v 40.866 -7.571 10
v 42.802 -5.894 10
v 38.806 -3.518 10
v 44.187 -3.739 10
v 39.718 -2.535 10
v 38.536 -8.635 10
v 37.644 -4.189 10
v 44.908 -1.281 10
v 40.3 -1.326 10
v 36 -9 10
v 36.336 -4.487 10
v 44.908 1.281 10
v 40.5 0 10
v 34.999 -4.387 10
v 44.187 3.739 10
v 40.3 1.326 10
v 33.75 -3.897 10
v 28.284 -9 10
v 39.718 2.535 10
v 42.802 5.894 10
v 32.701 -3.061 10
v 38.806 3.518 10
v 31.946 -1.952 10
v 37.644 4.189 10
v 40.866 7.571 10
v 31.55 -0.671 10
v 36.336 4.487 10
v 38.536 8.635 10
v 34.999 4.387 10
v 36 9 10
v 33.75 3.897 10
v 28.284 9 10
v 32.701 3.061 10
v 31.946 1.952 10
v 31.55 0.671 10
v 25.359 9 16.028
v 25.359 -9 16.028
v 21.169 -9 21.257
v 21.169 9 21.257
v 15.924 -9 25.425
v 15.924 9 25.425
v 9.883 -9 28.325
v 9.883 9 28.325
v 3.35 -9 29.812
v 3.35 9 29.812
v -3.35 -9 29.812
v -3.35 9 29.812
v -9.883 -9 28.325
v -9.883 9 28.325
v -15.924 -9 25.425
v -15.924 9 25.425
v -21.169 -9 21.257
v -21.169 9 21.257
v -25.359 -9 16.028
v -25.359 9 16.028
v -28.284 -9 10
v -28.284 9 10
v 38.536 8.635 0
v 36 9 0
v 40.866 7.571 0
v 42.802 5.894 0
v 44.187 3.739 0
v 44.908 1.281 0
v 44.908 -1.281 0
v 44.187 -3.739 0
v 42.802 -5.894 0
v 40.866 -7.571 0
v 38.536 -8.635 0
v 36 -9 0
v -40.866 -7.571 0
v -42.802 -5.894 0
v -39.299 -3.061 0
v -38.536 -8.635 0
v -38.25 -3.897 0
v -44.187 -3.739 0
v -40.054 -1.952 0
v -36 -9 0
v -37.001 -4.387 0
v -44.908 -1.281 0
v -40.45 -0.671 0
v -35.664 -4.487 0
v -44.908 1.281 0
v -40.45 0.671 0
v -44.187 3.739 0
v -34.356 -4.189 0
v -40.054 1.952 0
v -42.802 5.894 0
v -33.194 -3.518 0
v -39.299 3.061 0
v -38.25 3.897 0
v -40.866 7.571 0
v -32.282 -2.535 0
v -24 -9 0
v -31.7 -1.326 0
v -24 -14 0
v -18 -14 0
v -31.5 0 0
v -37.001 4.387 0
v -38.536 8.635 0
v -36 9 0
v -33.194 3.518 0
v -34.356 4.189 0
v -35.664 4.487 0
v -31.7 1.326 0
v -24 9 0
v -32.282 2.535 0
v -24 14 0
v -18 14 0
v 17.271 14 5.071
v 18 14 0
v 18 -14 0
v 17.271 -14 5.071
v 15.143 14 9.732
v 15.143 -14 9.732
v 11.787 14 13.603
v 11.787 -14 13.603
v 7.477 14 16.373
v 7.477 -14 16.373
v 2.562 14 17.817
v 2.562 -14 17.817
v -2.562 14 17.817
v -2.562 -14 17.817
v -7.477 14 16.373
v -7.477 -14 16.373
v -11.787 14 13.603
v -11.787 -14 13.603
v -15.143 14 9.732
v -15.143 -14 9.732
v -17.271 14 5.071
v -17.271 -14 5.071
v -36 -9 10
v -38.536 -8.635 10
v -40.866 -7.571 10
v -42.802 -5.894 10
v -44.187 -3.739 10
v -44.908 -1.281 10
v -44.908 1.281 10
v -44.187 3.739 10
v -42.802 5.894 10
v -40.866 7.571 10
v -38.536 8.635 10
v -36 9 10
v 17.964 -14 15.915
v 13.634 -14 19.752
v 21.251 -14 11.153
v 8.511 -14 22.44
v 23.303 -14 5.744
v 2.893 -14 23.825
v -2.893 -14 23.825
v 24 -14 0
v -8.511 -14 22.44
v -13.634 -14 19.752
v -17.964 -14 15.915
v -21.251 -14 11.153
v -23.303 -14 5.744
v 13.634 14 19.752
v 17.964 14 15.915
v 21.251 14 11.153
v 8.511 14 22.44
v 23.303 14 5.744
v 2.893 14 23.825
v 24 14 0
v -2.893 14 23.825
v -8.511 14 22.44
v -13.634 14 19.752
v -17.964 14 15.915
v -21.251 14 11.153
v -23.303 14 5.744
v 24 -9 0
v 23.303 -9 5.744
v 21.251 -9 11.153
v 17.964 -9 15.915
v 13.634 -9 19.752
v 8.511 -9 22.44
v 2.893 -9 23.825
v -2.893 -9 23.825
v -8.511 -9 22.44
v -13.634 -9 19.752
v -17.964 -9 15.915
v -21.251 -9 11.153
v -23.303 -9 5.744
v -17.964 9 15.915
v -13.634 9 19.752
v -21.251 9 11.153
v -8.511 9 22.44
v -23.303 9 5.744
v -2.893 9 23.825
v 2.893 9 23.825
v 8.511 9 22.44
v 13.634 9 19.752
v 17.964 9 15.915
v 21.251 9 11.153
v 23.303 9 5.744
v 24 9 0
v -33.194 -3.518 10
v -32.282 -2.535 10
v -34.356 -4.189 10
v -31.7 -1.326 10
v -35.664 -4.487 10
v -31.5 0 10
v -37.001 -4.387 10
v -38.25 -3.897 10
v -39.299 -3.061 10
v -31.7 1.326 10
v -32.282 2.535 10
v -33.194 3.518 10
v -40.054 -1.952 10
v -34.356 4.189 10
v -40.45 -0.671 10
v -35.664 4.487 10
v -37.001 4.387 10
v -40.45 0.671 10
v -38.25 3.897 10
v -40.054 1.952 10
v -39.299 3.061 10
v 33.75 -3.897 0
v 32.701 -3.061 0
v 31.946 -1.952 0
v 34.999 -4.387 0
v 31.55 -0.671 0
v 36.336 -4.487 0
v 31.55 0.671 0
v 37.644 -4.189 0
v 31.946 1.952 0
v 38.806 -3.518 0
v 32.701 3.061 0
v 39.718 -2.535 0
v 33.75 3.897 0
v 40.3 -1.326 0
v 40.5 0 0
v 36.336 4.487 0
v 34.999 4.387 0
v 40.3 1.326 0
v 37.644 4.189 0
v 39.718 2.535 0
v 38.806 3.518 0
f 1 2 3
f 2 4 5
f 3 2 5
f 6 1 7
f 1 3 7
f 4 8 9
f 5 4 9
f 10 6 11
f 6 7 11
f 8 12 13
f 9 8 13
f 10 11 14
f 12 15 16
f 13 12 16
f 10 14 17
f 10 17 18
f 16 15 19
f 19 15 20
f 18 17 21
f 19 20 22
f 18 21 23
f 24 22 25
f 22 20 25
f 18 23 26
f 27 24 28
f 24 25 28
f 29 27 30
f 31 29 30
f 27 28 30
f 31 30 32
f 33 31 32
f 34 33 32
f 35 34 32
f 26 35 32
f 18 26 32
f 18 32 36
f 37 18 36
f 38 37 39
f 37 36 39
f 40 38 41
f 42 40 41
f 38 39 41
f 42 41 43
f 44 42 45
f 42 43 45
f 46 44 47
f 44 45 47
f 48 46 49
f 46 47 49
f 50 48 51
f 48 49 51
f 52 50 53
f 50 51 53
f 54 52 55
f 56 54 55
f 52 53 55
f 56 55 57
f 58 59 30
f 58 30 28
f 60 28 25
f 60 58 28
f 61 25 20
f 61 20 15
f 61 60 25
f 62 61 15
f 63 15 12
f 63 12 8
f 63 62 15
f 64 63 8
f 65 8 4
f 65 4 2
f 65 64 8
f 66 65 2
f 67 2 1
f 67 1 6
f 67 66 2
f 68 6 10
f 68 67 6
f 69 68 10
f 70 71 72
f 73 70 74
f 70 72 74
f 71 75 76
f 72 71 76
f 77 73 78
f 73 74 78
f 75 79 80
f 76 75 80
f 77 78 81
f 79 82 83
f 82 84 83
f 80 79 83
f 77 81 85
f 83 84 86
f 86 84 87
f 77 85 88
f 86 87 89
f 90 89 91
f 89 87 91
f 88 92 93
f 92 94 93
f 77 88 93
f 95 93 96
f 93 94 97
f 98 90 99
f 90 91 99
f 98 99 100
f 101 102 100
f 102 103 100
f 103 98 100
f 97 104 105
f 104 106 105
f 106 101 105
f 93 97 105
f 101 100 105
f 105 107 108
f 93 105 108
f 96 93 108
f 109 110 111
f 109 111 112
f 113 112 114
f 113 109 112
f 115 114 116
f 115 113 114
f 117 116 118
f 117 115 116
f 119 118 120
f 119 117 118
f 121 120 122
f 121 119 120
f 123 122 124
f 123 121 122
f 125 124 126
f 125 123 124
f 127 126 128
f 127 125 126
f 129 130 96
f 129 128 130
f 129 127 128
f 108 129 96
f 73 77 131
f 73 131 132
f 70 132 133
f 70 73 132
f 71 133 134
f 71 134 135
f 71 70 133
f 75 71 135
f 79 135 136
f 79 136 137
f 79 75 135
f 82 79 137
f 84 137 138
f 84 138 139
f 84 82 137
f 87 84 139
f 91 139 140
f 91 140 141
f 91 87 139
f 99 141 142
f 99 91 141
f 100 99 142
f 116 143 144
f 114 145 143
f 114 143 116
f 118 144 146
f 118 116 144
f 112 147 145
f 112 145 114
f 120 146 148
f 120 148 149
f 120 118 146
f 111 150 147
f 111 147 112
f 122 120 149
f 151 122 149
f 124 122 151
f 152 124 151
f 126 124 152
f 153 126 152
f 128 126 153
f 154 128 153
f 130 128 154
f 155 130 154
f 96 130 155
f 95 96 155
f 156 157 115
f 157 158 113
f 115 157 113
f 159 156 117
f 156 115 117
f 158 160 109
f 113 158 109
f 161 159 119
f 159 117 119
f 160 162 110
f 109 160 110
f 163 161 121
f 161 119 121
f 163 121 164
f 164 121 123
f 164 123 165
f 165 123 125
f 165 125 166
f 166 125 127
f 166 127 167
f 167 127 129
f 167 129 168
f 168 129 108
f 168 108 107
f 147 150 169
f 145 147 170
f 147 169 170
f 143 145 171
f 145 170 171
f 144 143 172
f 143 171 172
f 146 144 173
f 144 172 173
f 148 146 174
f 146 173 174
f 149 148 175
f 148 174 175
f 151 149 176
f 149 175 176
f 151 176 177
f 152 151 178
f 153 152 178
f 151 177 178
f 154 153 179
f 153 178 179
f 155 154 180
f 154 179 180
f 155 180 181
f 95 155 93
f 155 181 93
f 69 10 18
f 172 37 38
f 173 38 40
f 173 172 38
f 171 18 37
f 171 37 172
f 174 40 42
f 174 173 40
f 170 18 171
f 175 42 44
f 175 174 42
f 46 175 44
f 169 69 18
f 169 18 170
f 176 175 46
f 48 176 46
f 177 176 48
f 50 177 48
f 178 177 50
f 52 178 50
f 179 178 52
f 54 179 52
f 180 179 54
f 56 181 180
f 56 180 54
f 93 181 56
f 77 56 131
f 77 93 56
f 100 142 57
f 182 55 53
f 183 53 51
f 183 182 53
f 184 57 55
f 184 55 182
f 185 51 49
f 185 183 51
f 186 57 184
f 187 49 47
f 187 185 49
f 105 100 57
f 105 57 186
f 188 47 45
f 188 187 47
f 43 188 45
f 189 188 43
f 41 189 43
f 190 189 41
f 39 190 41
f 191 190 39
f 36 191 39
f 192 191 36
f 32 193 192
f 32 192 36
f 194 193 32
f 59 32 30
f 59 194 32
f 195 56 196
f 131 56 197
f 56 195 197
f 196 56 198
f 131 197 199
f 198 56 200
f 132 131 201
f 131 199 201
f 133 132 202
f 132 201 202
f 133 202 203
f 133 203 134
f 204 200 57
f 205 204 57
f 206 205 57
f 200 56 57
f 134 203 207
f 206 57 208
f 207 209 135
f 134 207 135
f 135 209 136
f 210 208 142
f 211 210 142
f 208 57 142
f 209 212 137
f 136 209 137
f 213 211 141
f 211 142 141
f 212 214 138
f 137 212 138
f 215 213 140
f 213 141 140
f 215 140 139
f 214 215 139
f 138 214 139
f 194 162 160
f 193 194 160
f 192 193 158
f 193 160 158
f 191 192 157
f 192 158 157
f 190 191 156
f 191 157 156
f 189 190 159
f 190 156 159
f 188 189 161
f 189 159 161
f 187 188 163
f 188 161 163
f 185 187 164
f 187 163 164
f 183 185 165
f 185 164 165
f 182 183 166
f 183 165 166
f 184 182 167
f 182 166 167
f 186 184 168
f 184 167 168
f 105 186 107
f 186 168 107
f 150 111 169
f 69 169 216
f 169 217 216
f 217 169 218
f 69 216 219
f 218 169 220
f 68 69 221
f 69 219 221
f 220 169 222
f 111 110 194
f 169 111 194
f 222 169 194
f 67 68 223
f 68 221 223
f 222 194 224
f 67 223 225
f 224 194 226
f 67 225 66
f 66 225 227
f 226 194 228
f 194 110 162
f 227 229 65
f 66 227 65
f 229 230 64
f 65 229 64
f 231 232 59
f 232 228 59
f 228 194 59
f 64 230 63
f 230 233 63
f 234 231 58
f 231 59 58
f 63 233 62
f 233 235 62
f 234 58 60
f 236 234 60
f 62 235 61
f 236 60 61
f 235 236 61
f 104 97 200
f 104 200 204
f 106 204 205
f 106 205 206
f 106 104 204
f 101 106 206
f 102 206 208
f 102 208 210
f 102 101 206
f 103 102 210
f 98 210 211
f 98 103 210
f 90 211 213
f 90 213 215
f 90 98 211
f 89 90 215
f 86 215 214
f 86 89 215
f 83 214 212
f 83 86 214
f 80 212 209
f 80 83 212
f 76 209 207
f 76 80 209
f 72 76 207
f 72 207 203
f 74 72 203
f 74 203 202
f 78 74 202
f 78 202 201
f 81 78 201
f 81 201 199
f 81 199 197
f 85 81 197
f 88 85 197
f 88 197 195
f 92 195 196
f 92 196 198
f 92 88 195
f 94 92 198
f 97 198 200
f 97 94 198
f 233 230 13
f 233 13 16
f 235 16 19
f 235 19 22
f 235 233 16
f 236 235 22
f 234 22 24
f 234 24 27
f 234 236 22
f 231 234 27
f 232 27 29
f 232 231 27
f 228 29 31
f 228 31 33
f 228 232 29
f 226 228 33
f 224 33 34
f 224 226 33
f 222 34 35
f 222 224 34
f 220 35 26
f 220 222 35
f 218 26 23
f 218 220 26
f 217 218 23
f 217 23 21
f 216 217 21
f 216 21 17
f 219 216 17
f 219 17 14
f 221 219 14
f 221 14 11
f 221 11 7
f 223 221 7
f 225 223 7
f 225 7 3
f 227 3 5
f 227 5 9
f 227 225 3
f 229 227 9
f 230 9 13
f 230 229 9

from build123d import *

# Parameters (mm, degrees)
SKETCH_1_R          = 4.5
EXTRUDE_1_DEPTH     = 10
EXTRUDE_2_DEPTH     = 9
EXTRUDE_3_DEPTH     = 14
CUT_EXTRUDE_1_DEPTH = 29


with BuildPart() as part:
    # 草圖1 → 填料-伸長1 (new body)
    with BuildSketch(Plane.XY):
        with BuildLine():
            Line((-36, 9), (36, 9))
            ThreePointArc((36, 9), (45, 0), (36, -9))
            Line((36, -9), (-36, -9))
            ThreePointArc((-36, -9), (-45, 0), (-36, 9))
        make_face()
        with Locations((36, 0)):
            Circle(SKETCH_1_R, mode=Mode.SUBTRACT)
        with Locations((-36, 0)):
            Circle(SKETCH_1_R, mode=Mode.SUBTRACT)
    extrude(amount=EXTRUDE_1_DEPTH)

    # 草圖3 → 填料-伸長2 (add, symmetric)
    with BuildSketch(Plane(origin=(0, 0, 0), x_dir=(1, 0, 0), z_dir=(0, 1, 0))):
        with BuildLine():
            Line((-30, 0), (30, 0))
            ThreePointArc((30, 0), (0, -30), (-30, 0))
        make_face()
    extrude(amount=EXTRUDE_2_DEPTH, both=True)

    # 草圖4 → 填料-伸長3 (add, symmetric)
    with BuildSketch(Plane(origin=(0, 0, 0), x_dir=(1, 0, 0), z_dir=(0, 1, 0))):
        with BuildLine():
            Line((-24, 0), (24, 0))
            ThreePointArc((24, 0), (0, -24), (-24, 0))
        make_face()
    extrude(amount=EXTRUDE_3_DEPTH, both=True)

    # 草圖5 → 除料-伸長1 (cut, through all)
    with BuildSketch(Plane(origin=(0, 14, 0), x_dir=(1, 0, 0), z_dir=(0, 1, 0))):
        with BuildLine():
            Line((-18, 0), (18, 0))
            ThreePointArc((18, 0), (0, -18), (-18, 0))
        make_face()
    extrude(amount=-CUT_EXTRUDE_1_DEPTH, mode=Mode.SUBTRACT)


solid = part.part
